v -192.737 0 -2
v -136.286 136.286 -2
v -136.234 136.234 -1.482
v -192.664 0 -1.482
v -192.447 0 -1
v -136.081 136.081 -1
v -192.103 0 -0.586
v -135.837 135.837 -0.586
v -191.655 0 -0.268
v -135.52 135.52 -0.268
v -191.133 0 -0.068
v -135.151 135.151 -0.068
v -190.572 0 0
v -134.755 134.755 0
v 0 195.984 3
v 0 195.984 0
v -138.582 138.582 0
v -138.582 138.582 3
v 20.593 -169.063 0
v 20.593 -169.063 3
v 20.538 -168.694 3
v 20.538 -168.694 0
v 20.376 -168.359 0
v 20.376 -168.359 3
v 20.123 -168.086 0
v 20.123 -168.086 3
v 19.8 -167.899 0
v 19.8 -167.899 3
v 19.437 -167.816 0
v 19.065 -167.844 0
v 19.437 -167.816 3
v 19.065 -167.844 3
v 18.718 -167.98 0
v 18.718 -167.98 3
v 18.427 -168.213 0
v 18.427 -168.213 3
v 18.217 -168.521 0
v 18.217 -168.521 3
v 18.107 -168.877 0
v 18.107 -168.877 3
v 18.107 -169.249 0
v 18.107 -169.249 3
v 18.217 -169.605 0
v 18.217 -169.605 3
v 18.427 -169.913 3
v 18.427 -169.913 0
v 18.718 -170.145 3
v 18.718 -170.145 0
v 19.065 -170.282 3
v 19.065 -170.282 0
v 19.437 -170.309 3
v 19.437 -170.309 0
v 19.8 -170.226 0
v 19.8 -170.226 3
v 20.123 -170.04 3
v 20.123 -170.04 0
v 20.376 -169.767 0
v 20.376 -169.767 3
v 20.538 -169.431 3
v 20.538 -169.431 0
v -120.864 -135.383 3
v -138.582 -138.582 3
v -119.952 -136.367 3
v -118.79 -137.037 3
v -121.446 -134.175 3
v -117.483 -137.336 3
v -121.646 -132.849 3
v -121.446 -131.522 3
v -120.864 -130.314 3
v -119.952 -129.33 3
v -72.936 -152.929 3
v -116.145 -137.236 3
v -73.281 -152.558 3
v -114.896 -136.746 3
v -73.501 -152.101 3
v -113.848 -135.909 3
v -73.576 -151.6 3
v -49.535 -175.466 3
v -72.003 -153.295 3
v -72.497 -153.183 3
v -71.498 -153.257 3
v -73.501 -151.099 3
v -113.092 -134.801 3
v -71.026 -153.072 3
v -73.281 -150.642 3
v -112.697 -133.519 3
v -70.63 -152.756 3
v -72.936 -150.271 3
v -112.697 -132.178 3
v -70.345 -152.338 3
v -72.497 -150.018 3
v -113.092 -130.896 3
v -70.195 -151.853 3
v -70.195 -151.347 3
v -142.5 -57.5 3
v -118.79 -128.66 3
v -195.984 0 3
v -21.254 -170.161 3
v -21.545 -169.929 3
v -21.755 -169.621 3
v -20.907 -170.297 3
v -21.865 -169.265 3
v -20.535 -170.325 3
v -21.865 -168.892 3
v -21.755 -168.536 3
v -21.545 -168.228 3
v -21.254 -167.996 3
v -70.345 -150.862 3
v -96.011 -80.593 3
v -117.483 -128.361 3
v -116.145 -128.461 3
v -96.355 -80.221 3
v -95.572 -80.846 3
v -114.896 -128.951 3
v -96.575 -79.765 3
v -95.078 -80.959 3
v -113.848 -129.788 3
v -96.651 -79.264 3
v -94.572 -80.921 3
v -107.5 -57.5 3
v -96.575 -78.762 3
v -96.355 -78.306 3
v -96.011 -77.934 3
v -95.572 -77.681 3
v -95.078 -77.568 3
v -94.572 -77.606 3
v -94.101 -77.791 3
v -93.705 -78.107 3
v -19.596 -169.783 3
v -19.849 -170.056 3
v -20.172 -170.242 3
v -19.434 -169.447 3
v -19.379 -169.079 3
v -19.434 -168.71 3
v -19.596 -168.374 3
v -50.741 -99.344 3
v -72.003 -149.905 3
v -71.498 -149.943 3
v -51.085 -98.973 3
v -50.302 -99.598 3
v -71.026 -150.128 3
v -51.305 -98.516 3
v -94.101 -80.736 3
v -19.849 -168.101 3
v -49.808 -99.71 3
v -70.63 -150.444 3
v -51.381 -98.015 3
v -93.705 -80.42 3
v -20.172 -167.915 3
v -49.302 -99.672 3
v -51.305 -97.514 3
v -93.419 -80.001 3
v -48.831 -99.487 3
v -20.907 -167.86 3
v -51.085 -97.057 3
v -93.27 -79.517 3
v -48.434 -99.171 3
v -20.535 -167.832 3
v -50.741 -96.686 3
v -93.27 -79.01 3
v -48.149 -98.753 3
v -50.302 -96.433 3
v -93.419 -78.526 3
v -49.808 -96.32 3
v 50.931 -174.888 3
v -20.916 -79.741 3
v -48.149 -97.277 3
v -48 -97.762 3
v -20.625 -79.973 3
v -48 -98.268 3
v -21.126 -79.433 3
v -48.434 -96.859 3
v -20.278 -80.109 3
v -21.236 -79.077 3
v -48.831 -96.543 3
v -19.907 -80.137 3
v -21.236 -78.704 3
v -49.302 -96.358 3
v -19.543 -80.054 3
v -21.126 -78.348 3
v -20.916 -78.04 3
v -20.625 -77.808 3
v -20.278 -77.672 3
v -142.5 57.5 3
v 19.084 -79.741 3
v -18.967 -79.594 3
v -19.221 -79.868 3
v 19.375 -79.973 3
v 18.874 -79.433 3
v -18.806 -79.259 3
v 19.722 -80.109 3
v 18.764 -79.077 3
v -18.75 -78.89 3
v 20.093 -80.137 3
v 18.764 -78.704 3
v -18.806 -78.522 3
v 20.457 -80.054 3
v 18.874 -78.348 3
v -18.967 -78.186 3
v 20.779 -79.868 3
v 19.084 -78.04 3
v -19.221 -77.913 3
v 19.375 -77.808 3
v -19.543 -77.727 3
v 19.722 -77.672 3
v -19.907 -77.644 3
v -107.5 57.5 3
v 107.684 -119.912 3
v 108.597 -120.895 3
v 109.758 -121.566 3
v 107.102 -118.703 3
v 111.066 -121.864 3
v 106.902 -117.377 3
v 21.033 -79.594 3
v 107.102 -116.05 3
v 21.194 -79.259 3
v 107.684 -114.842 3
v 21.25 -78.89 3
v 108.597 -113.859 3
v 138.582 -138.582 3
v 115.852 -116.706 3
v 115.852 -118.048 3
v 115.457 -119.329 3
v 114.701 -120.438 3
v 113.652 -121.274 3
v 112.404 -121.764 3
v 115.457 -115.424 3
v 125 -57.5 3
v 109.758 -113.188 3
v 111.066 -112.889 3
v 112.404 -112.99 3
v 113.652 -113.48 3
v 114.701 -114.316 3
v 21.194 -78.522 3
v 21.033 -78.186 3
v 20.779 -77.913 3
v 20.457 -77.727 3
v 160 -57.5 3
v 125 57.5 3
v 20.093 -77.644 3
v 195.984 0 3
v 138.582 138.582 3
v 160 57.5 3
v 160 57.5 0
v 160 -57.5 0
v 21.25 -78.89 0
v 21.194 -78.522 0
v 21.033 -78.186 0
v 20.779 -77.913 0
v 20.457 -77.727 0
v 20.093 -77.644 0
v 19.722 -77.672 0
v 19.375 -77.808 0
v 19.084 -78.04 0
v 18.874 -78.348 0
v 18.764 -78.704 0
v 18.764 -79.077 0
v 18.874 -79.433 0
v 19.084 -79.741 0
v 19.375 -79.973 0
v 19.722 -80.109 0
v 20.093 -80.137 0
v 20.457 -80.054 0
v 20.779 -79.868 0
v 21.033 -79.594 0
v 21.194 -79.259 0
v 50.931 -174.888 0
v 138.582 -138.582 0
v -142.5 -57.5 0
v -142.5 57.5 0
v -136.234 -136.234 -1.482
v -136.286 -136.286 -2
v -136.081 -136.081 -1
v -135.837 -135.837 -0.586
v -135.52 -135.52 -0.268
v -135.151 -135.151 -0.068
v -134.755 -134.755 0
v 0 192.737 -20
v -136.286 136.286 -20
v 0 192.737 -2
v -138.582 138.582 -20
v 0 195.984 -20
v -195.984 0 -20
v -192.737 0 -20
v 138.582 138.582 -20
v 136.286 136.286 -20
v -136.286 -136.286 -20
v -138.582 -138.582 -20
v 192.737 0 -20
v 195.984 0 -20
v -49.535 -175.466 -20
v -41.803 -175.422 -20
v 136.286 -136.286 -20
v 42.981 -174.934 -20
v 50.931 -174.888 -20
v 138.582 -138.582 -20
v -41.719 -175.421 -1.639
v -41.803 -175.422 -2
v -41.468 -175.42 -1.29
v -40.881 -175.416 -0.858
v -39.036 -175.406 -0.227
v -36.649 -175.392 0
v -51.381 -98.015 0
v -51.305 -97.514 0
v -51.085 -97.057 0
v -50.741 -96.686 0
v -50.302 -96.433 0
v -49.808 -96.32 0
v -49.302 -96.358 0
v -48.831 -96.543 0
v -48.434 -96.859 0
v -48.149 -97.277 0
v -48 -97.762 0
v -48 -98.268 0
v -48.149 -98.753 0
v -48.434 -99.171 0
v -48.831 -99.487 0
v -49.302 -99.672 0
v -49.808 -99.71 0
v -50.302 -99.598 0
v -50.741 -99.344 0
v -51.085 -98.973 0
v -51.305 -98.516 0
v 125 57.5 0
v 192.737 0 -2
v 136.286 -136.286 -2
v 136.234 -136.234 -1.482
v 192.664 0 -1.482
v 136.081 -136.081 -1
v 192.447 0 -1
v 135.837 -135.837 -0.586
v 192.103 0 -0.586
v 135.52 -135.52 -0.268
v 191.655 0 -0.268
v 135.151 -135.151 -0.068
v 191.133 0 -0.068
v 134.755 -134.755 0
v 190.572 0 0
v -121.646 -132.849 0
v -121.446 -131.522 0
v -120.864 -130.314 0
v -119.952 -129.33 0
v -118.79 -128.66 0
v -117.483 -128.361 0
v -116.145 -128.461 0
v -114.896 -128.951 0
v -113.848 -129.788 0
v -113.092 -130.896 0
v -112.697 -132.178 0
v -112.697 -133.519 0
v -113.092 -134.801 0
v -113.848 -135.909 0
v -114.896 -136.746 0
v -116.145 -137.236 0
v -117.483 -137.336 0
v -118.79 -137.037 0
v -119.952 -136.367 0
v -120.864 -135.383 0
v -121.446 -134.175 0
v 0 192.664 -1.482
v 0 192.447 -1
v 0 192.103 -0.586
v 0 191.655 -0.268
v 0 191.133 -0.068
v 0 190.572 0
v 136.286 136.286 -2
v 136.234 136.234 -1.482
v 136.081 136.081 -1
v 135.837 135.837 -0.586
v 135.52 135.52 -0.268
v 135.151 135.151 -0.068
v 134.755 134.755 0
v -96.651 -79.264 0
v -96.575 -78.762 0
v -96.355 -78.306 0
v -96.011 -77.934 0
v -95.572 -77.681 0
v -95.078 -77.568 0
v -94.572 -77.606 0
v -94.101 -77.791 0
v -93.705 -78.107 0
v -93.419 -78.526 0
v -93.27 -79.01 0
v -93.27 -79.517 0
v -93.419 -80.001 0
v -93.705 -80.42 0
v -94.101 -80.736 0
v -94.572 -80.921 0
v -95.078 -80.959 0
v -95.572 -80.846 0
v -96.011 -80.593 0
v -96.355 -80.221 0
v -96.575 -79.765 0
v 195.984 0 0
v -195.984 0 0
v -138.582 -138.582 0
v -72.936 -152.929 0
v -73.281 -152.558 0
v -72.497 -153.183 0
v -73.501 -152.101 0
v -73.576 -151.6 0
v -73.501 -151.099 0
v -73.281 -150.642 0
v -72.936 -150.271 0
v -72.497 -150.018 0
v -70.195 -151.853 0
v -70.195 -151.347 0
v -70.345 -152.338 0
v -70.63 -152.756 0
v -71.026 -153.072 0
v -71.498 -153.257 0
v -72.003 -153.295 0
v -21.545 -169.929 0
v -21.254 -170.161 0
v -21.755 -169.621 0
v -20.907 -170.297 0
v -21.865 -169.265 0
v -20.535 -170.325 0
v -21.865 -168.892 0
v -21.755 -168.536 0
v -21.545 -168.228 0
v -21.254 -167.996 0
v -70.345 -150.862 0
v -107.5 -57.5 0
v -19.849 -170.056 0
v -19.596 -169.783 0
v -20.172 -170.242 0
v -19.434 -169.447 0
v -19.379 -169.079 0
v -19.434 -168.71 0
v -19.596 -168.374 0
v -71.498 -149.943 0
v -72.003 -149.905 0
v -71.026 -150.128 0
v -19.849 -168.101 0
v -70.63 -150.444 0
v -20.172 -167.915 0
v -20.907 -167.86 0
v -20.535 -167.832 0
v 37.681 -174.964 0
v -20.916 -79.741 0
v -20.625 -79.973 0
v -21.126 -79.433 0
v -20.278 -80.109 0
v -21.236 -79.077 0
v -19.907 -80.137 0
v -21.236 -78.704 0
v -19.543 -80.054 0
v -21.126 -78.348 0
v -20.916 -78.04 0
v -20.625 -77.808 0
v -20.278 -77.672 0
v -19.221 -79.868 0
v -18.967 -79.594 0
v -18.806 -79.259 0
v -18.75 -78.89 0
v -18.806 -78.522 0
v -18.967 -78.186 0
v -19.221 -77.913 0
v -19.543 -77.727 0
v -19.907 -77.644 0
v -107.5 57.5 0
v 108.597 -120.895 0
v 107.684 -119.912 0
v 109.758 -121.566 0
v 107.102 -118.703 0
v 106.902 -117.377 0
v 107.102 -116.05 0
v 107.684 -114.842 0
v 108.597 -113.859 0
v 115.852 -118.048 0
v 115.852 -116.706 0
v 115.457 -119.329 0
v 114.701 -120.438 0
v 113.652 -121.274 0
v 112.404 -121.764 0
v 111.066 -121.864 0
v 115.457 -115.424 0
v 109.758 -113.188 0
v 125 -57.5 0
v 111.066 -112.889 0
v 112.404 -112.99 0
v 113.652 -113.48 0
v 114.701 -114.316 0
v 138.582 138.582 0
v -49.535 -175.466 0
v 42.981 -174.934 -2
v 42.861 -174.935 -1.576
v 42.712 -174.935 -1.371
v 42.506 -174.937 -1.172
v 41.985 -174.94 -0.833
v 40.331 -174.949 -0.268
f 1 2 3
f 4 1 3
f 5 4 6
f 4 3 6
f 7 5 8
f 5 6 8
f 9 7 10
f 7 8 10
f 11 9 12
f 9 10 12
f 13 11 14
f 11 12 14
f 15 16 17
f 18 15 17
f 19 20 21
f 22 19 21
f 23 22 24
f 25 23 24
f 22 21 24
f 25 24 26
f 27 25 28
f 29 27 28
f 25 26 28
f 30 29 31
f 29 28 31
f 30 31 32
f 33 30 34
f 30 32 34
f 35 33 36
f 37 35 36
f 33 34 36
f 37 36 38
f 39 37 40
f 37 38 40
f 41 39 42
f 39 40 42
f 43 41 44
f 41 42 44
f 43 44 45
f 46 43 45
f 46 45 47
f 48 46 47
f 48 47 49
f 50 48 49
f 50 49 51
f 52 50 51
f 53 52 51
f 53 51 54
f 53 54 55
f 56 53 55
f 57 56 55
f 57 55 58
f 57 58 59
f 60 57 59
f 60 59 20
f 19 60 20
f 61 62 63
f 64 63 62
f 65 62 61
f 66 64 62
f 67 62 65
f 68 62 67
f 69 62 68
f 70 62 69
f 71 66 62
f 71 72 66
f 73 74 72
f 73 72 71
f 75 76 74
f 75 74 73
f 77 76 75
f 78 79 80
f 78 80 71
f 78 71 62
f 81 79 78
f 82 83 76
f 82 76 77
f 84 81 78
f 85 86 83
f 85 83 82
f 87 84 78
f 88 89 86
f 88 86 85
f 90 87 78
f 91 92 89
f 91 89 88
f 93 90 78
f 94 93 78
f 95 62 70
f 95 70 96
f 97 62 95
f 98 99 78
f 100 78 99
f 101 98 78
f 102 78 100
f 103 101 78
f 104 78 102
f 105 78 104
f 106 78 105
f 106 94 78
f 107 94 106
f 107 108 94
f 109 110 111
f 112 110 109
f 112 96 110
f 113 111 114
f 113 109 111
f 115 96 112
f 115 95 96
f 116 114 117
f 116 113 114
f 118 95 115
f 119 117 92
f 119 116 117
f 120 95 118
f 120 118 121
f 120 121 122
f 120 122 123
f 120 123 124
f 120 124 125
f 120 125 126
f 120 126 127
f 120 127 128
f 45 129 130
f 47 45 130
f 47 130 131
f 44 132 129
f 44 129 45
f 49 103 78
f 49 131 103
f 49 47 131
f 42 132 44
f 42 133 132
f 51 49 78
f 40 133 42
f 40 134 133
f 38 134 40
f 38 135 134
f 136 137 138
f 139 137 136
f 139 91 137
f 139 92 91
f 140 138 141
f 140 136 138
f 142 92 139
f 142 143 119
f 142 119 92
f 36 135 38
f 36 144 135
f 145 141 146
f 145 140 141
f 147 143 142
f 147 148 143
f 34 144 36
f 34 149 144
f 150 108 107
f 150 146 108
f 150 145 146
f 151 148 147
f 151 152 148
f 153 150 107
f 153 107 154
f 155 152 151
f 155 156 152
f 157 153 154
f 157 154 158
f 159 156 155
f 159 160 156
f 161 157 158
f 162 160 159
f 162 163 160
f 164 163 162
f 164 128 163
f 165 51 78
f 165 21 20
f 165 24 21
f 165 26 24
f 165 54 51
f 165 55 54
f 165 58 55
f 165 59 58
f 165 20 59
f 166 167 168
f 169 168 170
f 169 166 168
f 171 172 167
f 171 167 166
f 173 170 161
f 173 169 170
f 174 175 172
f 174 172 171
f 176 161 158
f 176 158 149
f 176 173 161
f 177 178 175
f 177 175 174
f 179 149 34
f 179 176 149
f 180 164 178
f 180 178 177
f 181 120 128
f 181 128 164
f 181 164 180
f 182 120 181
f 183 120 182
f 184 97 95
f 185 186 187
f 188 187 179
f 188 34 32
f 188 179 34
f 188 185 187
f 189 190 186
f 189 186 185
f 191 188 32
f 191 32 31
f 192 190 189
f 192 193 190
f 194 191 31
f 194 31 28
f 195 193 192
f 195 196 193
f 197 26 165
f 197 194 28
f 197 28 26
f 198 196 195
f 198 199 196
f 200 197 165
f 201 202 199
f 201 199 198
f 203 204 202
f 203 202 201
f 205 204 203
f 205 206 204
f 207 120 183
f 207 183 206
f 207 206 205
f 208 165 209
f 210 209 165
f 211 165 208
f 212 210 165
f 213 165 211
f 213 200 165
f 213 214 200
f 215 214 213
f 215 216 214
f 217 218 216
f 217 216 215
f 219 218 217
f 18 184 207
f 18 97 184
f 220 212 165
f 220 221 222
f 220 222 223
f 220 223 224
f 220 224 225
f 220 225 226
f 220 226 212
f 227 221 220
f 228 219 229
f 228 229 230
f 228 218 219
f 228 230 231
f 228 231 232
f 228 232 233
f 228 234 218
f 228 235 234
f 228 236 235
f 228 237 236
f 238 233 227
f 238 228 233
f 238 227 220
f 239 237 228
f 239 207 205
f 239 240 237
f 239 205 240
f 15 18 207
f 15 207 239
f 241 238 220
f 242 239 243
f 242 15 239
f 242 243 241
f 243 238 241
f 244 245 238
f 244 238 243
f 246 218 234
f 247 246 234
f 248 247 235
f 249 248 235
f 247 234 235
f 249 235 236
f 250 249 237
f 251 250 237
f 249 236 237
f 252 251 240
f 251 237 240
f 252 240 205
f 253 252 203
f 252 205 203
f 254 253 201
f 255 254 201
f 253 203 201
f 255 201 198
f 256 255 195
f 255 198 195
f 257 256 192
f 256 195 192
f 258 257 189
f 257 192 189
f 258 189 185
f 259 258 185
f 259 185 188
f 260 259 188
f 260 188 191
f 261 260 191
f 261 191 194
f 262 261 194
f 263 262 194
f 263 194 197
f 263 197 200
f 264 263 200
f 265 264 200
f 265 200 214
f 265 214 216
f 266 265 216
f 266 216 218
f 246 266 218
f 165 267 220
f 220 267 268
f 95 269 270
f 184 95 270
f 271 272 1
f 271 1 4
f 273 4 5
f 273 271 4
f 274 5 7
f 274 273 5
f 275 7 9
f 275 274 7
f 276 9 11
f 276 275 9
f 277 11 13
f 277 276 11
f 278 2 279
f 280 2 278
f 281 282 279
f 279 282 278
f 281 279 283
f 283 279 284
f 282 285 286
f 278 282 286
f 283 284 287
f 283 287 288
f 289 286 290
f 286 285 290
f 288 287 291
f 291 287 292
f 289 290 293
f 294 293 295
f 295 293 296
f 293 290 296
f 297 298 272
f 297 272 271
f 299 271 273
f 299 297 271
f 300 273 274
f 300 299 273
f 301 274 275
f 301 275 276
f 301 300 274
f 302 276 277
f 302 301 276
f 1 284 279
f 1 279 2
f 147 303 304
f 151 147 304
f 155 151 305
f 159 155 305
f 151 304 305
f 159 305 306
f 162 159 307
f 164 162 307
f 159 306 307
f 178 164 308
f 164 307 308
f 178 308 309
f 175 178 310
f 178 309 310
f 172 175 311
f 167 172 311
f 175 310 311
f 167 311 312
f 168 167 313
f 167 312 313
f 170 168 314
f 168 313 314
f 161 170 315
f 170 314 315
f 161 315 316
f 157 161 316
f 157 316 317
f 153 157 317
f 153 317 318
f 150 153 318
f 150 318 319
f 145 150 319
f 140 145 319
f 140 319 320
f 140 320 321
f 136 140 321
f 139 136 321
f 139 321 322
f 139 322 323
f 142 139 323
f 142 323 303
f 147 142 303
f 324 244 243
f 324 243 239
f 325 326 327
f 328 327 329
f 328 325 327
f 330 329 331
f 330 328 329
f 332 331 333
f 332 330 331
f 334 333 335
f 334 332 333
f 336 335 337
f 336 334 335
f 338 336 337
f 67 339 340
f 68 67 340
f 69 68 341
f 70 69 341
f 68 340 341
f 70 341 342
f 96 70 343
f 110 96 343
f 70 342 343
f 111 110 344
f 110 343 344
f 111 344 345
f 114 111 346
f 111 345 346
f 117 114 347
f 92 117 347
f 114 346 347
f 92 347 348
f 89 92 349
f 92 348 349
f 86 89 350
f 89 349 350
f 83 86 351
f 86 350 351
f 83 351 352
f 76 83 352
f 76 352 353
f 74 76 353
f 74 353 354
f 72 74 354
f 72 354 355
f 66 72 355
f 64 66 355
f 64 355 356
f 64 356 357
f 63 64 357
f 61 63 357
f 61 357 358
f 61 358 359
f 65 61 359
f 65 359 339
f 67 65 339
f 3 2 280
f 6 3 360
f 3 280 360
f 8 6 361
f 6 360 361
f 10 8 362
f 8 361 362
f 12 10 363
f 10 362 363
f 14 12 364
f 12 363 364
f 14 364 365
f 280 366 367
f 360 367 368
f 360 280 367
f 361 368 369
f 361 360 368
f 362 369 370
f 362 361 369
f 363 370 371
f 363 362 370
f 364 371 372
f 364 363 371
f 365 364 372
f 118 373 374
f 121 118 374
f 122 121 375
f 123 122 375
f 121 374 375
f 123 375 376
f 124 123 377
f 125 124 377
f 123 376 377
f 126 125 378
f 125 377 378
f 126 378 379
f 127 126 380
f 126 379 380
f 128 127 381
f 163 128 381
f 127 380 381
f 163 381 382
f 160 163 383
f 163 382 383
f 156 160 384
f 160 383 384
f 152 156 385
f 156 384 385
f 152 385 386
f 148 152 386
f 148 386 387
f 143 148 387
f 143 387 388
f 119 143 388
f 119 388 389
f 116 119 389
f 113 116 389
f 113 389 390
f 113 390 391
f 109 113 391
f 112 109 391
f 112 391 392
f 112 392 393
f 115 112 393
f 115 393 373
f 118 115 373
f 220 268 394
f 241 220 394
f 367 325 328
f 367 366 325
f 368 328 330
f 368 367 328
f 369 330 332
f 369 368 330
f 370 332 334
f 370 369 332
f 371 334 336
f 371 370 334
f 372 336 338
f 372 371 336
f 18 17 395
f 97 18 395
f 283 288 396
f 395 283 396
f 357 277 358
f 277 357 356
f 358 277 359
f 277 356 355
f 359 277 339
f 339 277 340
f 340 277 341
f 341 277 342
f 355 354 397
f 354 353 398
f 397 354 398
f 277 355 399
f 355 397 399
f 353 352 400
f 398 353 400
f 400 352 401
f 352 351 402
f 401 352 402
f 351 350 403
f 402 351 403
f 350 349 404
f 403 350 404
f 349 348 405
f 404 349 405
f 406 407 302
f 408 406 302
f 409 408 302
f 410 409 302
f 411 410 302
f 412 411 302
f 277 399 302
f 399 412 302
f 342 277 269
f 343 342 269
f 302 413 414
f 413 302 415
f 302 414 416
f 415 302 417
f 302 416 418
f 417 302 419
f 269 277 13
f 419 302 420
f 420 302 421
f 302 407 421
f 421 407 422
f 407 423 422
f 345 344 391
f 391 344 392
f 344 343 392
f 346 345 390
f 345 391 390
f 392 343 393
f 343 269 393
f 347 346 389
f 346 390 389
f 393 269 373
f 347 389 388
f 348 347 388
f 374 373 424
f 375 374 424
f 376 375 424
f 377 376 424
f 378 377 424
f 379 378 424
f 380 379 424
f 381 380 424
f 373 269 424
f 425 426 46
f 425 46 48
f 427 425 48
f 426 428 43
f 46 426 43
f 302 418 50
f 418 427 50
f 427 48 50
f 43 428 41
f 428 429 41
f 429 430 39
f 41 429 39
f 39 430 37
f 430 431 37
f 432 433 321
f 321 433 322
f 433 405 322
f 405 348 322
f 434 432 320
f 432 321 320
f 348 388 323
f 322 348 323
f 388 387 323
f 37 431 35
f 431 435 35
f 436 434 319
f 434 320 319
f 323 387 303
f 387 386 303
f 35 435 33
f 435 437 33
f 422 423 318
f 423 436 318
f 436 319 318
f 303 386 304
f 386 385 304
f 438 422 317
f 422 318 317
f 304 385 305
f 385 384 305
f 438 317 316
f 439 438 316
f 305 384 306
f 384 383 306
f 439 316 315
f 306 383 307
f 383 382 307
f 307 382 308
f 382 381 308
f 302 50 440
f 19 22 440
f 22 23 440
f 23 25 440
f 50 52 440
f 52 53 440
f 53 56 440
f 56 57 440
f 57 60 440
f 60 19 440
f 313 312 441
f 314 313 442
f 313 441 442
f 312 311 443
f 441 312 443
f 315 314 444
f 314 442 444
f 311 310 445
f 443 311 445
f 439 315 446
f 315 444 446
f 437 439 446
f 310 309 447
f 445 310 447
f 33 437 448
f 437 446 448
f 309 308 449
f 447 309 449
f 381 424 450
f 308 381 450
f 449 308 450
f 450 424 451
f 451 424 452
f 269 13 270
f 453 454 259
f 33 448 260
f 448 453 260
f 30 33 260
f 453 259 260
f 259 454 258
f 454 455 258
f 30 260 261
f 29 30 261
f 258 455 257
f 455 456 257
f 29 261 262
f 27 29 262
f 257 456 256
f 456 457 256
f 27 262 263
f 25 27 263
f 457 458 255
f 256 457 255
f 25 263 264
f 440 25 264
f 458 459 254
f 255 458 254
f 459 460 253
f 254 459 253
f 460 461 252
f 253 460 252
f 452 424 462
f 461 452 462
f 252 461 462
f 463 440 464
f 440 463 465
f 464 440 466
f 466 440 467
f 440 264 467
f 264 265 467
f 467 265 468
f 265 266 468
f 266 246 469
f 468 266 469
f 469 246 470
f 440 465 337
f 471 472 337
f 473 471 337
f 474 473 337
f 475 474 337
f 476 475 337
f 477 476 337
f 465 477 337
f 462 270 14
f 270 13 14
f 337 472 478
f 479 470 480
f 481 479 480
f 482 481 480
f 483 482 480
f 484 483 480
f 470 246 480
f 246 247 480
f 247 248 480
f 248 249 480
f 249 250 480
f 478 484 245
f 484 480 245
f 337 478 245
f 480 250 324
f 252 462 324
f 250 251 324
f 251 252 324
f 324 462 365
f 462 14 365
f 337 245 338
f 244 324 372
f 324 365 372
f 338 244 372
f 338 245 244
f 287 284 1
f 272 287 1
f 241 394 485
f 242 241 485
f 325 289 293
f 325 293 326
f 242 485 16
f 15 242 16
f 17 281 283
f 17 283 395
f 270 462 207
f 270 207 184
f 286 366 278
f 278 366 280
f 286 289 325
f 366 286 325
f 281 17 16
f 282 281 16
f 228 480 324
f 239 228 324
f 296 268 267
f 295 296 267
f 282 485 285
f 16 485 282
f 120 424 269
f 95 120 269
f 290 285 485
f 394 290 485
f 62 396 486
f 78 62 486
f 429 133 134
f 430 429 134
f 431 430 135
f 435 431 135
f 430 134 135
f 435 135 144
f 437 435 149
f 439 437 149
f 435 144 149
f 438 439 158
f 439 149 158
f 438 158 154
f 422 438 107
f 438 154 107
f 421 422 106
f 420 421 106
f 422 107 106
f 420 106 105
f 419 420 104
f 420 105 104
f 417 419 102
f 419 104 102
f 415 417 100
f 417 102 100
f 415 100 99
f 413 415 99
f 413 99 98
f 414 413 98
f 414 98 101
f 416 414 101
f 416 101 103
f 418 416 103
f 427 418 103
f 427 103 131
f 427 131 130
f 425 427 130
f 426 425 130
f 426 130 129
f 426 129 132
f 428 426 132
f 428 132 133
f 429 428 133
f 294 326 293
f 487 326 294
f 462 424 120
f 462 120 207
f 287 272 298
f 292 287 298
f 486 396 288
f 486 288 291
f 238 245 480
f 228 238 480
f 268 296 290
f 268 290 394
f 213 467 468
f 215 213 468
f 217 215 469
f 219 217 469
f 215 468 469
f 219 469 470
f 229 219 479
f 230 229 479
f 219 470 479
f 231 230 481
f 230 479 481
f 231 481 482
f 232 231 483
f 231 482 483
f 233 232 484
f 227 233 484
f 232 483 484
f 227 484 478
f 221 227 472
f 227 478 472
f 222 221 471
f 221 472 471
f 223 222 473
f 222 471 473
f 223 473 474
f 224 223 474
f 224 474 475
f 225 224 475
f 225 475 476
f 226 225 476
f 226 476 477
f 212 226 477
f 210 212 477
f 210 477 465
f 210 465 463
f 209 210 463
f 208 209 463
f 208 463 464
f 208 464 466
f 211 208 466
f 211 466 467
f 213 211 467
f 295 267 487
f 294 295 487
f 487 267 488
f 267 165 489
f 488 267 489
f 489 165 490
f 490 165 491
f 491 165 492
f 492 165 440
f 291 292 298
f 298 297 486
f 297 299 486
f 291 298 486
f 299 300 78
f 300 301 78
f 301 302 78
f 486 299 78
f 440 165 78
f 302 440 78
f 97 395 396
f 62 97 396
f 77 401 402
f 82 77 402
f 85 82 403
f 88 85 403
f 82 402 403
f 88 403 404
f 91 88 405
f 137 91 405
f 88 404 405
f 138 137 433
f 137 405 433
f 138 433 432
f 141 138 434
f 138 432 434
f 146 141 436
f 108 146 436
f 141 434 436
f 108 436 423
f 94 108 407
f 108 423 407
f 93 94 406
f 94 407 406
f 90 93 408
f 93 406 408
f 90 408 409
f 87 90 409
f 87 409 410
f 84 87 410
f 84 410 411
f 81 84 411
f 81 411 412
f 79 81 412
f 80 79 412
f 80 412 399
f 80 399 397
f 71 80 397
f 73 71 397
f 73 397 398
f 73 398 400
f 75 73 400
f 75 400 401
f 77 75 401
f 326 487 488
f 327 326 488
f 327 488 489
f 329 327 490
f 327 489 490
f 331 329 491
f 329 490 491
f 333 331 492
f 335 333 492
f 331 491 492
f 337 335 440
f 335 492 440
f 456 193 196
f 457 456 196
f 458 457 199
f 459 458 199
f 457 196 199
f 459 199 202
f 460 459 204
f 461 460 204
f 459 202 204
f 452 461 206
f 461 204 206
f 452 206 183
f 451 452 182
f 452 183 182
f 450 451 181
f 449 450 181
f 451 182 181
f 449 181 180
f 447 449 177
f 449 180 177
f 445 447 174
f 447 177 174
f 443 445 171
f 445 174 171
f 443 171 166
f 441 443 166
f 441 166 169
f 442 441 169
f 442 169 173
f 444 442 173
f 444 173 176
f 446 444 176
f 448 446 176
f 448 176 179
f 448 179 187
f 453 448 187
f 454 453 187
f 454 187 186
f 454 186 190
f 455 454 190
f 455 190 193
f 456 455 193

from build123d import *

# Parameters (mm, degrees)
BOSS_EXTRUDE1_DEPTH     = 3
SKETCH5_W               = 150
SKETCH5_H               = 20
BOSS_EXTRUDE2_DEPTH     = 3
MIRROR2_COPY_1_SKETCH_W = 150
MIRROR2_COPY_1_SKETCH_H = 20
MIRROR2_COPY_1_DEPTH    = 3
SKETCH6_W               = 23
SKETCH6_H               = 150
BOSS_EXTRUDE3_DEPTH     = 3
MIRROR4_COPY_1_SKETCH_W = 23
MIRROR4_COPY_1_SKETCH_H = 150
MIRROR4_COPY_1_DEPTH    = 3
MIRROR4_COPY_2_SKETCH_W = 23
MIRROR4_COPY_2_SKETCH_H = 150
MIRROR4_COPY_2_DEPTH    = 3
FILLET1_R               = 2
SKETCH4_W               = 35
SKETCH4_H               = 115
CUT_EXTRUDE1_DEPTH      = 10
TAP_DRILL_FOR_M3_TAP2_D = 2.5
TAP_DRILL_FOR_M3_TAP3_D = 2.5
M3_CLEARANCE_HOLE1_D    = 3.4
M8_CLEARANCE_HOLE1_D    = 9
CUT_EXTRUDE2_DEPTH      = 20
CUT_EXTRUDE2_DEPTH_BACK = 3


with BuildPart() as part:
    # Sketch1 → Boss-Extrude1 (new body)
    with BuildSketch(Plane.XY):
        Polygon((0, 195.984444731), (-138.581929877, 138.581929877), (-195.984444731, 0), (-138.581929877, -138.581929877), (0, -195.984444731), (138.581929877, -138.581929877), (195.984444731, 0), (138.581929877, 138.581929877), align=None)
    boss_extrude1 = extrude(amount=BOSS_EXTRUDE1_DEPTH)

    # Sketch5 → Boss-Extrude2 (add)
    with BuildSketch(Plane(origin=(-69.290964938, -167.283187304, 0), x_dir=(0.923879533, -0.382683432, 0), z_dir=(-0.382683432, -0.923879533, 0))):
        with Locations((0, -10)):
            Rectangle(SKETCH5_W, SKETCH5_H)
    boss_extrude2 = extrude(amount=-BOSS_EXTRUDE2_DEPTH)

    # Mirror1: Boss-Extrude2 across plane
    add(boss_extrude2.mirror(Plane.ZX))

    # Mirror2: Boss-Extrude2 across plane
    add(boss_extrude2.mirror(Plane(origin=(0, 0, 0), x_dir=(0, 0, 1), z_dir=(1, 0, 0))))

    # Mirror2 copy 1 sketch → Mirror2 copy 1 (add)
    with BuildSketch(Plane(origin=(69.290964938, 167.283187304, 0), x_dir=(-0.923879533, 0.382683432, 0), z_dir=(0.382683432, 0.923879533, 0))):
        with Locations((0, -10)):
            Rectangle(MIRROR2_COPY_1_SKETCH_W, MIRROR2_COPY_1_SKETCH_H)
    extrude(amount=-MIRROR2_COPY_1_DEPTH)

    # Sketch6 → Boss-Extrude3 (add)
    with BuildSketch(Plane(origin=(-167.283187304, -69.290964938, 0), x_dir=(0, 0, 1), z_dir=(-0.923879533, -0.382683432, 0))):
        with Locations((-8.5, 0)):
            Rectangle(SKETCH6_W, SKETCH6_H)
    boss_extrude3 = extrude(amount=-BOSS_EXTRUDE3_DEPTH)

    # Mirror3: Boss-Extrude3 across plane
    add(boss_extrude3.mirror(Plane.ZX))

    # Mirror4: Boss-Extrude1 across plane
    add(boss_extrude1.mirror(Plane(origin=(0, 0, 0), x_dir=(0, 0, 1), z_dir=(1, 0, 0))))

    # Mirror4 copy 1 sketch → Mirror4 copy 1 (add)
    with BuildSketch(Plane(origin=(167.283187304, 69.290964938, 0), x_dir=(0, 0, 1), z_dir=(0.923879533, 0.382683432, 0))):
        with Locations((-8.5, 0)):
            Rectangle(MIRROR4_COPY_1_SKETCH_W, MIRROR4_COPY_1_SKETCH_H)
    extrude(amount=-MIRROR4_COPY_1_DEPTH)

    # Mirror4 copy 2 sketch → Mirror4 copy 2 (add)
    with BuildSketch(Plane(origin=(167.283187304, -69.290964938, 0), x_dir=(0, 0, 1), z_dir=(0.923879533, -0.382683432, 0))):
        with Locations((-8.5, 0)):
            Rectangle(MIRROR4_COPY_2_SKETCH_W, MIRROR4_COPY_2_SKETCH_H)
    extrude(amount=-MIRROR4_COPY_2_DEPTH)

    # Fillet1
    fillet1_edges = [part.edges().sort_by_distance(p)[0] for p in [
        (-164.511548707, -68.142914641, 0),
        (-164.511548707, 68.142914641, 0),
        (164.511548707, 68.142914641, 0),
        (164.511548707, -68.142914641, 0),
        (-68.142914641, 164.511548707, 0),
        (68.142914641, 164.511548707, 0),
        (-68.142914641, -164.511548707, 0),
        (68.142914641, -164.511548707, 0),
    ]]
    fillet(fillet1_edges, radius=FILLET1_R)

    # Sketch4 → Cut-Extrude1 (cut)
    with BuildSketch(Plane(origin=(0, 0, 0), x_dir=(-1, 0, 0), z_dir=(0, 0, -1))):
        with Locations((-142.5, 0)):
            Rectangle(SKETCH4_W, SKETCH4_H)
        with Locations((125, 0)):
            Rectangle(SKETCH4_W, SKETCH4_H)
    extrude(amount=-CUT_EXTRUDE1_DEPTH, mode=Mode.SUBTRACT)

    # Tap Drill for M3 Tap2 (through all)
    with Locations(Plane(origin=(0, 0, 0), x_dir=(-1, 0, 0), z_dir=(0, 0, -1))):
        with Locations((-19.343368816, -169.062877249), (20.628515923, -169.078590597)):
            Hole(TAP_DRILL_FOR_M3_TAP2_D / 2)

    # Tap Drill for M3 Tap3 (through all)
    with Locations(Plane(origin=(0, 0, 0), x_dir=(-1, 0, 0), z_dir=(0, 0, -1))):
        with Locations((-20, -78.890298866), (20, -78.890298866)):
            Hole(TAP_DRILL_FOR_M3_TAP3_D / 2)

    # M3 Clearance Hole1 (through all)
    with Locations(Plane.XY.offset(3)):
        with Locations((-49.680592478, -98.01502722), (-71.876231555, -151.600040105), (-117.146328648, -132.848551919), (-94.950689571, -79.263539034)):
            Hole(M3_CLEARANCE_HOLE1_D / 2)

    # M8 Clearance Hole1 (through all)
    with Locations(Plane.XY.offset(3)):
        with Locations((111.402419859, -117.376896871), (-117.146328648, -132.848551919)):
            Hole(M8_CLEARANCE_HOLE1_D / 2)

    # Sketch21 → Cut-Extrude2 (cut, two sides)
    with BuildSketch(Plane(origin=(0, 0, 0), x_dir=(-1, 0, 0), z_dir=(0, 0, -1))) as cut_extrude2_sk:
        Polygon((0, -195.984444731), (-50.931031111, -174.8881209), (49.535442442, -175.466192654), align=None)
    extrude(amount=CUT_EXTRUDE2_DEPTH, mode=Mode.SUBTRACT)
    extrude(cut_extrude2_sk.sketch, amount=-CUT_EXTRUDE2_DEPTH_BACK, mode=Mode.SUBTRACT)


solid = part.part
